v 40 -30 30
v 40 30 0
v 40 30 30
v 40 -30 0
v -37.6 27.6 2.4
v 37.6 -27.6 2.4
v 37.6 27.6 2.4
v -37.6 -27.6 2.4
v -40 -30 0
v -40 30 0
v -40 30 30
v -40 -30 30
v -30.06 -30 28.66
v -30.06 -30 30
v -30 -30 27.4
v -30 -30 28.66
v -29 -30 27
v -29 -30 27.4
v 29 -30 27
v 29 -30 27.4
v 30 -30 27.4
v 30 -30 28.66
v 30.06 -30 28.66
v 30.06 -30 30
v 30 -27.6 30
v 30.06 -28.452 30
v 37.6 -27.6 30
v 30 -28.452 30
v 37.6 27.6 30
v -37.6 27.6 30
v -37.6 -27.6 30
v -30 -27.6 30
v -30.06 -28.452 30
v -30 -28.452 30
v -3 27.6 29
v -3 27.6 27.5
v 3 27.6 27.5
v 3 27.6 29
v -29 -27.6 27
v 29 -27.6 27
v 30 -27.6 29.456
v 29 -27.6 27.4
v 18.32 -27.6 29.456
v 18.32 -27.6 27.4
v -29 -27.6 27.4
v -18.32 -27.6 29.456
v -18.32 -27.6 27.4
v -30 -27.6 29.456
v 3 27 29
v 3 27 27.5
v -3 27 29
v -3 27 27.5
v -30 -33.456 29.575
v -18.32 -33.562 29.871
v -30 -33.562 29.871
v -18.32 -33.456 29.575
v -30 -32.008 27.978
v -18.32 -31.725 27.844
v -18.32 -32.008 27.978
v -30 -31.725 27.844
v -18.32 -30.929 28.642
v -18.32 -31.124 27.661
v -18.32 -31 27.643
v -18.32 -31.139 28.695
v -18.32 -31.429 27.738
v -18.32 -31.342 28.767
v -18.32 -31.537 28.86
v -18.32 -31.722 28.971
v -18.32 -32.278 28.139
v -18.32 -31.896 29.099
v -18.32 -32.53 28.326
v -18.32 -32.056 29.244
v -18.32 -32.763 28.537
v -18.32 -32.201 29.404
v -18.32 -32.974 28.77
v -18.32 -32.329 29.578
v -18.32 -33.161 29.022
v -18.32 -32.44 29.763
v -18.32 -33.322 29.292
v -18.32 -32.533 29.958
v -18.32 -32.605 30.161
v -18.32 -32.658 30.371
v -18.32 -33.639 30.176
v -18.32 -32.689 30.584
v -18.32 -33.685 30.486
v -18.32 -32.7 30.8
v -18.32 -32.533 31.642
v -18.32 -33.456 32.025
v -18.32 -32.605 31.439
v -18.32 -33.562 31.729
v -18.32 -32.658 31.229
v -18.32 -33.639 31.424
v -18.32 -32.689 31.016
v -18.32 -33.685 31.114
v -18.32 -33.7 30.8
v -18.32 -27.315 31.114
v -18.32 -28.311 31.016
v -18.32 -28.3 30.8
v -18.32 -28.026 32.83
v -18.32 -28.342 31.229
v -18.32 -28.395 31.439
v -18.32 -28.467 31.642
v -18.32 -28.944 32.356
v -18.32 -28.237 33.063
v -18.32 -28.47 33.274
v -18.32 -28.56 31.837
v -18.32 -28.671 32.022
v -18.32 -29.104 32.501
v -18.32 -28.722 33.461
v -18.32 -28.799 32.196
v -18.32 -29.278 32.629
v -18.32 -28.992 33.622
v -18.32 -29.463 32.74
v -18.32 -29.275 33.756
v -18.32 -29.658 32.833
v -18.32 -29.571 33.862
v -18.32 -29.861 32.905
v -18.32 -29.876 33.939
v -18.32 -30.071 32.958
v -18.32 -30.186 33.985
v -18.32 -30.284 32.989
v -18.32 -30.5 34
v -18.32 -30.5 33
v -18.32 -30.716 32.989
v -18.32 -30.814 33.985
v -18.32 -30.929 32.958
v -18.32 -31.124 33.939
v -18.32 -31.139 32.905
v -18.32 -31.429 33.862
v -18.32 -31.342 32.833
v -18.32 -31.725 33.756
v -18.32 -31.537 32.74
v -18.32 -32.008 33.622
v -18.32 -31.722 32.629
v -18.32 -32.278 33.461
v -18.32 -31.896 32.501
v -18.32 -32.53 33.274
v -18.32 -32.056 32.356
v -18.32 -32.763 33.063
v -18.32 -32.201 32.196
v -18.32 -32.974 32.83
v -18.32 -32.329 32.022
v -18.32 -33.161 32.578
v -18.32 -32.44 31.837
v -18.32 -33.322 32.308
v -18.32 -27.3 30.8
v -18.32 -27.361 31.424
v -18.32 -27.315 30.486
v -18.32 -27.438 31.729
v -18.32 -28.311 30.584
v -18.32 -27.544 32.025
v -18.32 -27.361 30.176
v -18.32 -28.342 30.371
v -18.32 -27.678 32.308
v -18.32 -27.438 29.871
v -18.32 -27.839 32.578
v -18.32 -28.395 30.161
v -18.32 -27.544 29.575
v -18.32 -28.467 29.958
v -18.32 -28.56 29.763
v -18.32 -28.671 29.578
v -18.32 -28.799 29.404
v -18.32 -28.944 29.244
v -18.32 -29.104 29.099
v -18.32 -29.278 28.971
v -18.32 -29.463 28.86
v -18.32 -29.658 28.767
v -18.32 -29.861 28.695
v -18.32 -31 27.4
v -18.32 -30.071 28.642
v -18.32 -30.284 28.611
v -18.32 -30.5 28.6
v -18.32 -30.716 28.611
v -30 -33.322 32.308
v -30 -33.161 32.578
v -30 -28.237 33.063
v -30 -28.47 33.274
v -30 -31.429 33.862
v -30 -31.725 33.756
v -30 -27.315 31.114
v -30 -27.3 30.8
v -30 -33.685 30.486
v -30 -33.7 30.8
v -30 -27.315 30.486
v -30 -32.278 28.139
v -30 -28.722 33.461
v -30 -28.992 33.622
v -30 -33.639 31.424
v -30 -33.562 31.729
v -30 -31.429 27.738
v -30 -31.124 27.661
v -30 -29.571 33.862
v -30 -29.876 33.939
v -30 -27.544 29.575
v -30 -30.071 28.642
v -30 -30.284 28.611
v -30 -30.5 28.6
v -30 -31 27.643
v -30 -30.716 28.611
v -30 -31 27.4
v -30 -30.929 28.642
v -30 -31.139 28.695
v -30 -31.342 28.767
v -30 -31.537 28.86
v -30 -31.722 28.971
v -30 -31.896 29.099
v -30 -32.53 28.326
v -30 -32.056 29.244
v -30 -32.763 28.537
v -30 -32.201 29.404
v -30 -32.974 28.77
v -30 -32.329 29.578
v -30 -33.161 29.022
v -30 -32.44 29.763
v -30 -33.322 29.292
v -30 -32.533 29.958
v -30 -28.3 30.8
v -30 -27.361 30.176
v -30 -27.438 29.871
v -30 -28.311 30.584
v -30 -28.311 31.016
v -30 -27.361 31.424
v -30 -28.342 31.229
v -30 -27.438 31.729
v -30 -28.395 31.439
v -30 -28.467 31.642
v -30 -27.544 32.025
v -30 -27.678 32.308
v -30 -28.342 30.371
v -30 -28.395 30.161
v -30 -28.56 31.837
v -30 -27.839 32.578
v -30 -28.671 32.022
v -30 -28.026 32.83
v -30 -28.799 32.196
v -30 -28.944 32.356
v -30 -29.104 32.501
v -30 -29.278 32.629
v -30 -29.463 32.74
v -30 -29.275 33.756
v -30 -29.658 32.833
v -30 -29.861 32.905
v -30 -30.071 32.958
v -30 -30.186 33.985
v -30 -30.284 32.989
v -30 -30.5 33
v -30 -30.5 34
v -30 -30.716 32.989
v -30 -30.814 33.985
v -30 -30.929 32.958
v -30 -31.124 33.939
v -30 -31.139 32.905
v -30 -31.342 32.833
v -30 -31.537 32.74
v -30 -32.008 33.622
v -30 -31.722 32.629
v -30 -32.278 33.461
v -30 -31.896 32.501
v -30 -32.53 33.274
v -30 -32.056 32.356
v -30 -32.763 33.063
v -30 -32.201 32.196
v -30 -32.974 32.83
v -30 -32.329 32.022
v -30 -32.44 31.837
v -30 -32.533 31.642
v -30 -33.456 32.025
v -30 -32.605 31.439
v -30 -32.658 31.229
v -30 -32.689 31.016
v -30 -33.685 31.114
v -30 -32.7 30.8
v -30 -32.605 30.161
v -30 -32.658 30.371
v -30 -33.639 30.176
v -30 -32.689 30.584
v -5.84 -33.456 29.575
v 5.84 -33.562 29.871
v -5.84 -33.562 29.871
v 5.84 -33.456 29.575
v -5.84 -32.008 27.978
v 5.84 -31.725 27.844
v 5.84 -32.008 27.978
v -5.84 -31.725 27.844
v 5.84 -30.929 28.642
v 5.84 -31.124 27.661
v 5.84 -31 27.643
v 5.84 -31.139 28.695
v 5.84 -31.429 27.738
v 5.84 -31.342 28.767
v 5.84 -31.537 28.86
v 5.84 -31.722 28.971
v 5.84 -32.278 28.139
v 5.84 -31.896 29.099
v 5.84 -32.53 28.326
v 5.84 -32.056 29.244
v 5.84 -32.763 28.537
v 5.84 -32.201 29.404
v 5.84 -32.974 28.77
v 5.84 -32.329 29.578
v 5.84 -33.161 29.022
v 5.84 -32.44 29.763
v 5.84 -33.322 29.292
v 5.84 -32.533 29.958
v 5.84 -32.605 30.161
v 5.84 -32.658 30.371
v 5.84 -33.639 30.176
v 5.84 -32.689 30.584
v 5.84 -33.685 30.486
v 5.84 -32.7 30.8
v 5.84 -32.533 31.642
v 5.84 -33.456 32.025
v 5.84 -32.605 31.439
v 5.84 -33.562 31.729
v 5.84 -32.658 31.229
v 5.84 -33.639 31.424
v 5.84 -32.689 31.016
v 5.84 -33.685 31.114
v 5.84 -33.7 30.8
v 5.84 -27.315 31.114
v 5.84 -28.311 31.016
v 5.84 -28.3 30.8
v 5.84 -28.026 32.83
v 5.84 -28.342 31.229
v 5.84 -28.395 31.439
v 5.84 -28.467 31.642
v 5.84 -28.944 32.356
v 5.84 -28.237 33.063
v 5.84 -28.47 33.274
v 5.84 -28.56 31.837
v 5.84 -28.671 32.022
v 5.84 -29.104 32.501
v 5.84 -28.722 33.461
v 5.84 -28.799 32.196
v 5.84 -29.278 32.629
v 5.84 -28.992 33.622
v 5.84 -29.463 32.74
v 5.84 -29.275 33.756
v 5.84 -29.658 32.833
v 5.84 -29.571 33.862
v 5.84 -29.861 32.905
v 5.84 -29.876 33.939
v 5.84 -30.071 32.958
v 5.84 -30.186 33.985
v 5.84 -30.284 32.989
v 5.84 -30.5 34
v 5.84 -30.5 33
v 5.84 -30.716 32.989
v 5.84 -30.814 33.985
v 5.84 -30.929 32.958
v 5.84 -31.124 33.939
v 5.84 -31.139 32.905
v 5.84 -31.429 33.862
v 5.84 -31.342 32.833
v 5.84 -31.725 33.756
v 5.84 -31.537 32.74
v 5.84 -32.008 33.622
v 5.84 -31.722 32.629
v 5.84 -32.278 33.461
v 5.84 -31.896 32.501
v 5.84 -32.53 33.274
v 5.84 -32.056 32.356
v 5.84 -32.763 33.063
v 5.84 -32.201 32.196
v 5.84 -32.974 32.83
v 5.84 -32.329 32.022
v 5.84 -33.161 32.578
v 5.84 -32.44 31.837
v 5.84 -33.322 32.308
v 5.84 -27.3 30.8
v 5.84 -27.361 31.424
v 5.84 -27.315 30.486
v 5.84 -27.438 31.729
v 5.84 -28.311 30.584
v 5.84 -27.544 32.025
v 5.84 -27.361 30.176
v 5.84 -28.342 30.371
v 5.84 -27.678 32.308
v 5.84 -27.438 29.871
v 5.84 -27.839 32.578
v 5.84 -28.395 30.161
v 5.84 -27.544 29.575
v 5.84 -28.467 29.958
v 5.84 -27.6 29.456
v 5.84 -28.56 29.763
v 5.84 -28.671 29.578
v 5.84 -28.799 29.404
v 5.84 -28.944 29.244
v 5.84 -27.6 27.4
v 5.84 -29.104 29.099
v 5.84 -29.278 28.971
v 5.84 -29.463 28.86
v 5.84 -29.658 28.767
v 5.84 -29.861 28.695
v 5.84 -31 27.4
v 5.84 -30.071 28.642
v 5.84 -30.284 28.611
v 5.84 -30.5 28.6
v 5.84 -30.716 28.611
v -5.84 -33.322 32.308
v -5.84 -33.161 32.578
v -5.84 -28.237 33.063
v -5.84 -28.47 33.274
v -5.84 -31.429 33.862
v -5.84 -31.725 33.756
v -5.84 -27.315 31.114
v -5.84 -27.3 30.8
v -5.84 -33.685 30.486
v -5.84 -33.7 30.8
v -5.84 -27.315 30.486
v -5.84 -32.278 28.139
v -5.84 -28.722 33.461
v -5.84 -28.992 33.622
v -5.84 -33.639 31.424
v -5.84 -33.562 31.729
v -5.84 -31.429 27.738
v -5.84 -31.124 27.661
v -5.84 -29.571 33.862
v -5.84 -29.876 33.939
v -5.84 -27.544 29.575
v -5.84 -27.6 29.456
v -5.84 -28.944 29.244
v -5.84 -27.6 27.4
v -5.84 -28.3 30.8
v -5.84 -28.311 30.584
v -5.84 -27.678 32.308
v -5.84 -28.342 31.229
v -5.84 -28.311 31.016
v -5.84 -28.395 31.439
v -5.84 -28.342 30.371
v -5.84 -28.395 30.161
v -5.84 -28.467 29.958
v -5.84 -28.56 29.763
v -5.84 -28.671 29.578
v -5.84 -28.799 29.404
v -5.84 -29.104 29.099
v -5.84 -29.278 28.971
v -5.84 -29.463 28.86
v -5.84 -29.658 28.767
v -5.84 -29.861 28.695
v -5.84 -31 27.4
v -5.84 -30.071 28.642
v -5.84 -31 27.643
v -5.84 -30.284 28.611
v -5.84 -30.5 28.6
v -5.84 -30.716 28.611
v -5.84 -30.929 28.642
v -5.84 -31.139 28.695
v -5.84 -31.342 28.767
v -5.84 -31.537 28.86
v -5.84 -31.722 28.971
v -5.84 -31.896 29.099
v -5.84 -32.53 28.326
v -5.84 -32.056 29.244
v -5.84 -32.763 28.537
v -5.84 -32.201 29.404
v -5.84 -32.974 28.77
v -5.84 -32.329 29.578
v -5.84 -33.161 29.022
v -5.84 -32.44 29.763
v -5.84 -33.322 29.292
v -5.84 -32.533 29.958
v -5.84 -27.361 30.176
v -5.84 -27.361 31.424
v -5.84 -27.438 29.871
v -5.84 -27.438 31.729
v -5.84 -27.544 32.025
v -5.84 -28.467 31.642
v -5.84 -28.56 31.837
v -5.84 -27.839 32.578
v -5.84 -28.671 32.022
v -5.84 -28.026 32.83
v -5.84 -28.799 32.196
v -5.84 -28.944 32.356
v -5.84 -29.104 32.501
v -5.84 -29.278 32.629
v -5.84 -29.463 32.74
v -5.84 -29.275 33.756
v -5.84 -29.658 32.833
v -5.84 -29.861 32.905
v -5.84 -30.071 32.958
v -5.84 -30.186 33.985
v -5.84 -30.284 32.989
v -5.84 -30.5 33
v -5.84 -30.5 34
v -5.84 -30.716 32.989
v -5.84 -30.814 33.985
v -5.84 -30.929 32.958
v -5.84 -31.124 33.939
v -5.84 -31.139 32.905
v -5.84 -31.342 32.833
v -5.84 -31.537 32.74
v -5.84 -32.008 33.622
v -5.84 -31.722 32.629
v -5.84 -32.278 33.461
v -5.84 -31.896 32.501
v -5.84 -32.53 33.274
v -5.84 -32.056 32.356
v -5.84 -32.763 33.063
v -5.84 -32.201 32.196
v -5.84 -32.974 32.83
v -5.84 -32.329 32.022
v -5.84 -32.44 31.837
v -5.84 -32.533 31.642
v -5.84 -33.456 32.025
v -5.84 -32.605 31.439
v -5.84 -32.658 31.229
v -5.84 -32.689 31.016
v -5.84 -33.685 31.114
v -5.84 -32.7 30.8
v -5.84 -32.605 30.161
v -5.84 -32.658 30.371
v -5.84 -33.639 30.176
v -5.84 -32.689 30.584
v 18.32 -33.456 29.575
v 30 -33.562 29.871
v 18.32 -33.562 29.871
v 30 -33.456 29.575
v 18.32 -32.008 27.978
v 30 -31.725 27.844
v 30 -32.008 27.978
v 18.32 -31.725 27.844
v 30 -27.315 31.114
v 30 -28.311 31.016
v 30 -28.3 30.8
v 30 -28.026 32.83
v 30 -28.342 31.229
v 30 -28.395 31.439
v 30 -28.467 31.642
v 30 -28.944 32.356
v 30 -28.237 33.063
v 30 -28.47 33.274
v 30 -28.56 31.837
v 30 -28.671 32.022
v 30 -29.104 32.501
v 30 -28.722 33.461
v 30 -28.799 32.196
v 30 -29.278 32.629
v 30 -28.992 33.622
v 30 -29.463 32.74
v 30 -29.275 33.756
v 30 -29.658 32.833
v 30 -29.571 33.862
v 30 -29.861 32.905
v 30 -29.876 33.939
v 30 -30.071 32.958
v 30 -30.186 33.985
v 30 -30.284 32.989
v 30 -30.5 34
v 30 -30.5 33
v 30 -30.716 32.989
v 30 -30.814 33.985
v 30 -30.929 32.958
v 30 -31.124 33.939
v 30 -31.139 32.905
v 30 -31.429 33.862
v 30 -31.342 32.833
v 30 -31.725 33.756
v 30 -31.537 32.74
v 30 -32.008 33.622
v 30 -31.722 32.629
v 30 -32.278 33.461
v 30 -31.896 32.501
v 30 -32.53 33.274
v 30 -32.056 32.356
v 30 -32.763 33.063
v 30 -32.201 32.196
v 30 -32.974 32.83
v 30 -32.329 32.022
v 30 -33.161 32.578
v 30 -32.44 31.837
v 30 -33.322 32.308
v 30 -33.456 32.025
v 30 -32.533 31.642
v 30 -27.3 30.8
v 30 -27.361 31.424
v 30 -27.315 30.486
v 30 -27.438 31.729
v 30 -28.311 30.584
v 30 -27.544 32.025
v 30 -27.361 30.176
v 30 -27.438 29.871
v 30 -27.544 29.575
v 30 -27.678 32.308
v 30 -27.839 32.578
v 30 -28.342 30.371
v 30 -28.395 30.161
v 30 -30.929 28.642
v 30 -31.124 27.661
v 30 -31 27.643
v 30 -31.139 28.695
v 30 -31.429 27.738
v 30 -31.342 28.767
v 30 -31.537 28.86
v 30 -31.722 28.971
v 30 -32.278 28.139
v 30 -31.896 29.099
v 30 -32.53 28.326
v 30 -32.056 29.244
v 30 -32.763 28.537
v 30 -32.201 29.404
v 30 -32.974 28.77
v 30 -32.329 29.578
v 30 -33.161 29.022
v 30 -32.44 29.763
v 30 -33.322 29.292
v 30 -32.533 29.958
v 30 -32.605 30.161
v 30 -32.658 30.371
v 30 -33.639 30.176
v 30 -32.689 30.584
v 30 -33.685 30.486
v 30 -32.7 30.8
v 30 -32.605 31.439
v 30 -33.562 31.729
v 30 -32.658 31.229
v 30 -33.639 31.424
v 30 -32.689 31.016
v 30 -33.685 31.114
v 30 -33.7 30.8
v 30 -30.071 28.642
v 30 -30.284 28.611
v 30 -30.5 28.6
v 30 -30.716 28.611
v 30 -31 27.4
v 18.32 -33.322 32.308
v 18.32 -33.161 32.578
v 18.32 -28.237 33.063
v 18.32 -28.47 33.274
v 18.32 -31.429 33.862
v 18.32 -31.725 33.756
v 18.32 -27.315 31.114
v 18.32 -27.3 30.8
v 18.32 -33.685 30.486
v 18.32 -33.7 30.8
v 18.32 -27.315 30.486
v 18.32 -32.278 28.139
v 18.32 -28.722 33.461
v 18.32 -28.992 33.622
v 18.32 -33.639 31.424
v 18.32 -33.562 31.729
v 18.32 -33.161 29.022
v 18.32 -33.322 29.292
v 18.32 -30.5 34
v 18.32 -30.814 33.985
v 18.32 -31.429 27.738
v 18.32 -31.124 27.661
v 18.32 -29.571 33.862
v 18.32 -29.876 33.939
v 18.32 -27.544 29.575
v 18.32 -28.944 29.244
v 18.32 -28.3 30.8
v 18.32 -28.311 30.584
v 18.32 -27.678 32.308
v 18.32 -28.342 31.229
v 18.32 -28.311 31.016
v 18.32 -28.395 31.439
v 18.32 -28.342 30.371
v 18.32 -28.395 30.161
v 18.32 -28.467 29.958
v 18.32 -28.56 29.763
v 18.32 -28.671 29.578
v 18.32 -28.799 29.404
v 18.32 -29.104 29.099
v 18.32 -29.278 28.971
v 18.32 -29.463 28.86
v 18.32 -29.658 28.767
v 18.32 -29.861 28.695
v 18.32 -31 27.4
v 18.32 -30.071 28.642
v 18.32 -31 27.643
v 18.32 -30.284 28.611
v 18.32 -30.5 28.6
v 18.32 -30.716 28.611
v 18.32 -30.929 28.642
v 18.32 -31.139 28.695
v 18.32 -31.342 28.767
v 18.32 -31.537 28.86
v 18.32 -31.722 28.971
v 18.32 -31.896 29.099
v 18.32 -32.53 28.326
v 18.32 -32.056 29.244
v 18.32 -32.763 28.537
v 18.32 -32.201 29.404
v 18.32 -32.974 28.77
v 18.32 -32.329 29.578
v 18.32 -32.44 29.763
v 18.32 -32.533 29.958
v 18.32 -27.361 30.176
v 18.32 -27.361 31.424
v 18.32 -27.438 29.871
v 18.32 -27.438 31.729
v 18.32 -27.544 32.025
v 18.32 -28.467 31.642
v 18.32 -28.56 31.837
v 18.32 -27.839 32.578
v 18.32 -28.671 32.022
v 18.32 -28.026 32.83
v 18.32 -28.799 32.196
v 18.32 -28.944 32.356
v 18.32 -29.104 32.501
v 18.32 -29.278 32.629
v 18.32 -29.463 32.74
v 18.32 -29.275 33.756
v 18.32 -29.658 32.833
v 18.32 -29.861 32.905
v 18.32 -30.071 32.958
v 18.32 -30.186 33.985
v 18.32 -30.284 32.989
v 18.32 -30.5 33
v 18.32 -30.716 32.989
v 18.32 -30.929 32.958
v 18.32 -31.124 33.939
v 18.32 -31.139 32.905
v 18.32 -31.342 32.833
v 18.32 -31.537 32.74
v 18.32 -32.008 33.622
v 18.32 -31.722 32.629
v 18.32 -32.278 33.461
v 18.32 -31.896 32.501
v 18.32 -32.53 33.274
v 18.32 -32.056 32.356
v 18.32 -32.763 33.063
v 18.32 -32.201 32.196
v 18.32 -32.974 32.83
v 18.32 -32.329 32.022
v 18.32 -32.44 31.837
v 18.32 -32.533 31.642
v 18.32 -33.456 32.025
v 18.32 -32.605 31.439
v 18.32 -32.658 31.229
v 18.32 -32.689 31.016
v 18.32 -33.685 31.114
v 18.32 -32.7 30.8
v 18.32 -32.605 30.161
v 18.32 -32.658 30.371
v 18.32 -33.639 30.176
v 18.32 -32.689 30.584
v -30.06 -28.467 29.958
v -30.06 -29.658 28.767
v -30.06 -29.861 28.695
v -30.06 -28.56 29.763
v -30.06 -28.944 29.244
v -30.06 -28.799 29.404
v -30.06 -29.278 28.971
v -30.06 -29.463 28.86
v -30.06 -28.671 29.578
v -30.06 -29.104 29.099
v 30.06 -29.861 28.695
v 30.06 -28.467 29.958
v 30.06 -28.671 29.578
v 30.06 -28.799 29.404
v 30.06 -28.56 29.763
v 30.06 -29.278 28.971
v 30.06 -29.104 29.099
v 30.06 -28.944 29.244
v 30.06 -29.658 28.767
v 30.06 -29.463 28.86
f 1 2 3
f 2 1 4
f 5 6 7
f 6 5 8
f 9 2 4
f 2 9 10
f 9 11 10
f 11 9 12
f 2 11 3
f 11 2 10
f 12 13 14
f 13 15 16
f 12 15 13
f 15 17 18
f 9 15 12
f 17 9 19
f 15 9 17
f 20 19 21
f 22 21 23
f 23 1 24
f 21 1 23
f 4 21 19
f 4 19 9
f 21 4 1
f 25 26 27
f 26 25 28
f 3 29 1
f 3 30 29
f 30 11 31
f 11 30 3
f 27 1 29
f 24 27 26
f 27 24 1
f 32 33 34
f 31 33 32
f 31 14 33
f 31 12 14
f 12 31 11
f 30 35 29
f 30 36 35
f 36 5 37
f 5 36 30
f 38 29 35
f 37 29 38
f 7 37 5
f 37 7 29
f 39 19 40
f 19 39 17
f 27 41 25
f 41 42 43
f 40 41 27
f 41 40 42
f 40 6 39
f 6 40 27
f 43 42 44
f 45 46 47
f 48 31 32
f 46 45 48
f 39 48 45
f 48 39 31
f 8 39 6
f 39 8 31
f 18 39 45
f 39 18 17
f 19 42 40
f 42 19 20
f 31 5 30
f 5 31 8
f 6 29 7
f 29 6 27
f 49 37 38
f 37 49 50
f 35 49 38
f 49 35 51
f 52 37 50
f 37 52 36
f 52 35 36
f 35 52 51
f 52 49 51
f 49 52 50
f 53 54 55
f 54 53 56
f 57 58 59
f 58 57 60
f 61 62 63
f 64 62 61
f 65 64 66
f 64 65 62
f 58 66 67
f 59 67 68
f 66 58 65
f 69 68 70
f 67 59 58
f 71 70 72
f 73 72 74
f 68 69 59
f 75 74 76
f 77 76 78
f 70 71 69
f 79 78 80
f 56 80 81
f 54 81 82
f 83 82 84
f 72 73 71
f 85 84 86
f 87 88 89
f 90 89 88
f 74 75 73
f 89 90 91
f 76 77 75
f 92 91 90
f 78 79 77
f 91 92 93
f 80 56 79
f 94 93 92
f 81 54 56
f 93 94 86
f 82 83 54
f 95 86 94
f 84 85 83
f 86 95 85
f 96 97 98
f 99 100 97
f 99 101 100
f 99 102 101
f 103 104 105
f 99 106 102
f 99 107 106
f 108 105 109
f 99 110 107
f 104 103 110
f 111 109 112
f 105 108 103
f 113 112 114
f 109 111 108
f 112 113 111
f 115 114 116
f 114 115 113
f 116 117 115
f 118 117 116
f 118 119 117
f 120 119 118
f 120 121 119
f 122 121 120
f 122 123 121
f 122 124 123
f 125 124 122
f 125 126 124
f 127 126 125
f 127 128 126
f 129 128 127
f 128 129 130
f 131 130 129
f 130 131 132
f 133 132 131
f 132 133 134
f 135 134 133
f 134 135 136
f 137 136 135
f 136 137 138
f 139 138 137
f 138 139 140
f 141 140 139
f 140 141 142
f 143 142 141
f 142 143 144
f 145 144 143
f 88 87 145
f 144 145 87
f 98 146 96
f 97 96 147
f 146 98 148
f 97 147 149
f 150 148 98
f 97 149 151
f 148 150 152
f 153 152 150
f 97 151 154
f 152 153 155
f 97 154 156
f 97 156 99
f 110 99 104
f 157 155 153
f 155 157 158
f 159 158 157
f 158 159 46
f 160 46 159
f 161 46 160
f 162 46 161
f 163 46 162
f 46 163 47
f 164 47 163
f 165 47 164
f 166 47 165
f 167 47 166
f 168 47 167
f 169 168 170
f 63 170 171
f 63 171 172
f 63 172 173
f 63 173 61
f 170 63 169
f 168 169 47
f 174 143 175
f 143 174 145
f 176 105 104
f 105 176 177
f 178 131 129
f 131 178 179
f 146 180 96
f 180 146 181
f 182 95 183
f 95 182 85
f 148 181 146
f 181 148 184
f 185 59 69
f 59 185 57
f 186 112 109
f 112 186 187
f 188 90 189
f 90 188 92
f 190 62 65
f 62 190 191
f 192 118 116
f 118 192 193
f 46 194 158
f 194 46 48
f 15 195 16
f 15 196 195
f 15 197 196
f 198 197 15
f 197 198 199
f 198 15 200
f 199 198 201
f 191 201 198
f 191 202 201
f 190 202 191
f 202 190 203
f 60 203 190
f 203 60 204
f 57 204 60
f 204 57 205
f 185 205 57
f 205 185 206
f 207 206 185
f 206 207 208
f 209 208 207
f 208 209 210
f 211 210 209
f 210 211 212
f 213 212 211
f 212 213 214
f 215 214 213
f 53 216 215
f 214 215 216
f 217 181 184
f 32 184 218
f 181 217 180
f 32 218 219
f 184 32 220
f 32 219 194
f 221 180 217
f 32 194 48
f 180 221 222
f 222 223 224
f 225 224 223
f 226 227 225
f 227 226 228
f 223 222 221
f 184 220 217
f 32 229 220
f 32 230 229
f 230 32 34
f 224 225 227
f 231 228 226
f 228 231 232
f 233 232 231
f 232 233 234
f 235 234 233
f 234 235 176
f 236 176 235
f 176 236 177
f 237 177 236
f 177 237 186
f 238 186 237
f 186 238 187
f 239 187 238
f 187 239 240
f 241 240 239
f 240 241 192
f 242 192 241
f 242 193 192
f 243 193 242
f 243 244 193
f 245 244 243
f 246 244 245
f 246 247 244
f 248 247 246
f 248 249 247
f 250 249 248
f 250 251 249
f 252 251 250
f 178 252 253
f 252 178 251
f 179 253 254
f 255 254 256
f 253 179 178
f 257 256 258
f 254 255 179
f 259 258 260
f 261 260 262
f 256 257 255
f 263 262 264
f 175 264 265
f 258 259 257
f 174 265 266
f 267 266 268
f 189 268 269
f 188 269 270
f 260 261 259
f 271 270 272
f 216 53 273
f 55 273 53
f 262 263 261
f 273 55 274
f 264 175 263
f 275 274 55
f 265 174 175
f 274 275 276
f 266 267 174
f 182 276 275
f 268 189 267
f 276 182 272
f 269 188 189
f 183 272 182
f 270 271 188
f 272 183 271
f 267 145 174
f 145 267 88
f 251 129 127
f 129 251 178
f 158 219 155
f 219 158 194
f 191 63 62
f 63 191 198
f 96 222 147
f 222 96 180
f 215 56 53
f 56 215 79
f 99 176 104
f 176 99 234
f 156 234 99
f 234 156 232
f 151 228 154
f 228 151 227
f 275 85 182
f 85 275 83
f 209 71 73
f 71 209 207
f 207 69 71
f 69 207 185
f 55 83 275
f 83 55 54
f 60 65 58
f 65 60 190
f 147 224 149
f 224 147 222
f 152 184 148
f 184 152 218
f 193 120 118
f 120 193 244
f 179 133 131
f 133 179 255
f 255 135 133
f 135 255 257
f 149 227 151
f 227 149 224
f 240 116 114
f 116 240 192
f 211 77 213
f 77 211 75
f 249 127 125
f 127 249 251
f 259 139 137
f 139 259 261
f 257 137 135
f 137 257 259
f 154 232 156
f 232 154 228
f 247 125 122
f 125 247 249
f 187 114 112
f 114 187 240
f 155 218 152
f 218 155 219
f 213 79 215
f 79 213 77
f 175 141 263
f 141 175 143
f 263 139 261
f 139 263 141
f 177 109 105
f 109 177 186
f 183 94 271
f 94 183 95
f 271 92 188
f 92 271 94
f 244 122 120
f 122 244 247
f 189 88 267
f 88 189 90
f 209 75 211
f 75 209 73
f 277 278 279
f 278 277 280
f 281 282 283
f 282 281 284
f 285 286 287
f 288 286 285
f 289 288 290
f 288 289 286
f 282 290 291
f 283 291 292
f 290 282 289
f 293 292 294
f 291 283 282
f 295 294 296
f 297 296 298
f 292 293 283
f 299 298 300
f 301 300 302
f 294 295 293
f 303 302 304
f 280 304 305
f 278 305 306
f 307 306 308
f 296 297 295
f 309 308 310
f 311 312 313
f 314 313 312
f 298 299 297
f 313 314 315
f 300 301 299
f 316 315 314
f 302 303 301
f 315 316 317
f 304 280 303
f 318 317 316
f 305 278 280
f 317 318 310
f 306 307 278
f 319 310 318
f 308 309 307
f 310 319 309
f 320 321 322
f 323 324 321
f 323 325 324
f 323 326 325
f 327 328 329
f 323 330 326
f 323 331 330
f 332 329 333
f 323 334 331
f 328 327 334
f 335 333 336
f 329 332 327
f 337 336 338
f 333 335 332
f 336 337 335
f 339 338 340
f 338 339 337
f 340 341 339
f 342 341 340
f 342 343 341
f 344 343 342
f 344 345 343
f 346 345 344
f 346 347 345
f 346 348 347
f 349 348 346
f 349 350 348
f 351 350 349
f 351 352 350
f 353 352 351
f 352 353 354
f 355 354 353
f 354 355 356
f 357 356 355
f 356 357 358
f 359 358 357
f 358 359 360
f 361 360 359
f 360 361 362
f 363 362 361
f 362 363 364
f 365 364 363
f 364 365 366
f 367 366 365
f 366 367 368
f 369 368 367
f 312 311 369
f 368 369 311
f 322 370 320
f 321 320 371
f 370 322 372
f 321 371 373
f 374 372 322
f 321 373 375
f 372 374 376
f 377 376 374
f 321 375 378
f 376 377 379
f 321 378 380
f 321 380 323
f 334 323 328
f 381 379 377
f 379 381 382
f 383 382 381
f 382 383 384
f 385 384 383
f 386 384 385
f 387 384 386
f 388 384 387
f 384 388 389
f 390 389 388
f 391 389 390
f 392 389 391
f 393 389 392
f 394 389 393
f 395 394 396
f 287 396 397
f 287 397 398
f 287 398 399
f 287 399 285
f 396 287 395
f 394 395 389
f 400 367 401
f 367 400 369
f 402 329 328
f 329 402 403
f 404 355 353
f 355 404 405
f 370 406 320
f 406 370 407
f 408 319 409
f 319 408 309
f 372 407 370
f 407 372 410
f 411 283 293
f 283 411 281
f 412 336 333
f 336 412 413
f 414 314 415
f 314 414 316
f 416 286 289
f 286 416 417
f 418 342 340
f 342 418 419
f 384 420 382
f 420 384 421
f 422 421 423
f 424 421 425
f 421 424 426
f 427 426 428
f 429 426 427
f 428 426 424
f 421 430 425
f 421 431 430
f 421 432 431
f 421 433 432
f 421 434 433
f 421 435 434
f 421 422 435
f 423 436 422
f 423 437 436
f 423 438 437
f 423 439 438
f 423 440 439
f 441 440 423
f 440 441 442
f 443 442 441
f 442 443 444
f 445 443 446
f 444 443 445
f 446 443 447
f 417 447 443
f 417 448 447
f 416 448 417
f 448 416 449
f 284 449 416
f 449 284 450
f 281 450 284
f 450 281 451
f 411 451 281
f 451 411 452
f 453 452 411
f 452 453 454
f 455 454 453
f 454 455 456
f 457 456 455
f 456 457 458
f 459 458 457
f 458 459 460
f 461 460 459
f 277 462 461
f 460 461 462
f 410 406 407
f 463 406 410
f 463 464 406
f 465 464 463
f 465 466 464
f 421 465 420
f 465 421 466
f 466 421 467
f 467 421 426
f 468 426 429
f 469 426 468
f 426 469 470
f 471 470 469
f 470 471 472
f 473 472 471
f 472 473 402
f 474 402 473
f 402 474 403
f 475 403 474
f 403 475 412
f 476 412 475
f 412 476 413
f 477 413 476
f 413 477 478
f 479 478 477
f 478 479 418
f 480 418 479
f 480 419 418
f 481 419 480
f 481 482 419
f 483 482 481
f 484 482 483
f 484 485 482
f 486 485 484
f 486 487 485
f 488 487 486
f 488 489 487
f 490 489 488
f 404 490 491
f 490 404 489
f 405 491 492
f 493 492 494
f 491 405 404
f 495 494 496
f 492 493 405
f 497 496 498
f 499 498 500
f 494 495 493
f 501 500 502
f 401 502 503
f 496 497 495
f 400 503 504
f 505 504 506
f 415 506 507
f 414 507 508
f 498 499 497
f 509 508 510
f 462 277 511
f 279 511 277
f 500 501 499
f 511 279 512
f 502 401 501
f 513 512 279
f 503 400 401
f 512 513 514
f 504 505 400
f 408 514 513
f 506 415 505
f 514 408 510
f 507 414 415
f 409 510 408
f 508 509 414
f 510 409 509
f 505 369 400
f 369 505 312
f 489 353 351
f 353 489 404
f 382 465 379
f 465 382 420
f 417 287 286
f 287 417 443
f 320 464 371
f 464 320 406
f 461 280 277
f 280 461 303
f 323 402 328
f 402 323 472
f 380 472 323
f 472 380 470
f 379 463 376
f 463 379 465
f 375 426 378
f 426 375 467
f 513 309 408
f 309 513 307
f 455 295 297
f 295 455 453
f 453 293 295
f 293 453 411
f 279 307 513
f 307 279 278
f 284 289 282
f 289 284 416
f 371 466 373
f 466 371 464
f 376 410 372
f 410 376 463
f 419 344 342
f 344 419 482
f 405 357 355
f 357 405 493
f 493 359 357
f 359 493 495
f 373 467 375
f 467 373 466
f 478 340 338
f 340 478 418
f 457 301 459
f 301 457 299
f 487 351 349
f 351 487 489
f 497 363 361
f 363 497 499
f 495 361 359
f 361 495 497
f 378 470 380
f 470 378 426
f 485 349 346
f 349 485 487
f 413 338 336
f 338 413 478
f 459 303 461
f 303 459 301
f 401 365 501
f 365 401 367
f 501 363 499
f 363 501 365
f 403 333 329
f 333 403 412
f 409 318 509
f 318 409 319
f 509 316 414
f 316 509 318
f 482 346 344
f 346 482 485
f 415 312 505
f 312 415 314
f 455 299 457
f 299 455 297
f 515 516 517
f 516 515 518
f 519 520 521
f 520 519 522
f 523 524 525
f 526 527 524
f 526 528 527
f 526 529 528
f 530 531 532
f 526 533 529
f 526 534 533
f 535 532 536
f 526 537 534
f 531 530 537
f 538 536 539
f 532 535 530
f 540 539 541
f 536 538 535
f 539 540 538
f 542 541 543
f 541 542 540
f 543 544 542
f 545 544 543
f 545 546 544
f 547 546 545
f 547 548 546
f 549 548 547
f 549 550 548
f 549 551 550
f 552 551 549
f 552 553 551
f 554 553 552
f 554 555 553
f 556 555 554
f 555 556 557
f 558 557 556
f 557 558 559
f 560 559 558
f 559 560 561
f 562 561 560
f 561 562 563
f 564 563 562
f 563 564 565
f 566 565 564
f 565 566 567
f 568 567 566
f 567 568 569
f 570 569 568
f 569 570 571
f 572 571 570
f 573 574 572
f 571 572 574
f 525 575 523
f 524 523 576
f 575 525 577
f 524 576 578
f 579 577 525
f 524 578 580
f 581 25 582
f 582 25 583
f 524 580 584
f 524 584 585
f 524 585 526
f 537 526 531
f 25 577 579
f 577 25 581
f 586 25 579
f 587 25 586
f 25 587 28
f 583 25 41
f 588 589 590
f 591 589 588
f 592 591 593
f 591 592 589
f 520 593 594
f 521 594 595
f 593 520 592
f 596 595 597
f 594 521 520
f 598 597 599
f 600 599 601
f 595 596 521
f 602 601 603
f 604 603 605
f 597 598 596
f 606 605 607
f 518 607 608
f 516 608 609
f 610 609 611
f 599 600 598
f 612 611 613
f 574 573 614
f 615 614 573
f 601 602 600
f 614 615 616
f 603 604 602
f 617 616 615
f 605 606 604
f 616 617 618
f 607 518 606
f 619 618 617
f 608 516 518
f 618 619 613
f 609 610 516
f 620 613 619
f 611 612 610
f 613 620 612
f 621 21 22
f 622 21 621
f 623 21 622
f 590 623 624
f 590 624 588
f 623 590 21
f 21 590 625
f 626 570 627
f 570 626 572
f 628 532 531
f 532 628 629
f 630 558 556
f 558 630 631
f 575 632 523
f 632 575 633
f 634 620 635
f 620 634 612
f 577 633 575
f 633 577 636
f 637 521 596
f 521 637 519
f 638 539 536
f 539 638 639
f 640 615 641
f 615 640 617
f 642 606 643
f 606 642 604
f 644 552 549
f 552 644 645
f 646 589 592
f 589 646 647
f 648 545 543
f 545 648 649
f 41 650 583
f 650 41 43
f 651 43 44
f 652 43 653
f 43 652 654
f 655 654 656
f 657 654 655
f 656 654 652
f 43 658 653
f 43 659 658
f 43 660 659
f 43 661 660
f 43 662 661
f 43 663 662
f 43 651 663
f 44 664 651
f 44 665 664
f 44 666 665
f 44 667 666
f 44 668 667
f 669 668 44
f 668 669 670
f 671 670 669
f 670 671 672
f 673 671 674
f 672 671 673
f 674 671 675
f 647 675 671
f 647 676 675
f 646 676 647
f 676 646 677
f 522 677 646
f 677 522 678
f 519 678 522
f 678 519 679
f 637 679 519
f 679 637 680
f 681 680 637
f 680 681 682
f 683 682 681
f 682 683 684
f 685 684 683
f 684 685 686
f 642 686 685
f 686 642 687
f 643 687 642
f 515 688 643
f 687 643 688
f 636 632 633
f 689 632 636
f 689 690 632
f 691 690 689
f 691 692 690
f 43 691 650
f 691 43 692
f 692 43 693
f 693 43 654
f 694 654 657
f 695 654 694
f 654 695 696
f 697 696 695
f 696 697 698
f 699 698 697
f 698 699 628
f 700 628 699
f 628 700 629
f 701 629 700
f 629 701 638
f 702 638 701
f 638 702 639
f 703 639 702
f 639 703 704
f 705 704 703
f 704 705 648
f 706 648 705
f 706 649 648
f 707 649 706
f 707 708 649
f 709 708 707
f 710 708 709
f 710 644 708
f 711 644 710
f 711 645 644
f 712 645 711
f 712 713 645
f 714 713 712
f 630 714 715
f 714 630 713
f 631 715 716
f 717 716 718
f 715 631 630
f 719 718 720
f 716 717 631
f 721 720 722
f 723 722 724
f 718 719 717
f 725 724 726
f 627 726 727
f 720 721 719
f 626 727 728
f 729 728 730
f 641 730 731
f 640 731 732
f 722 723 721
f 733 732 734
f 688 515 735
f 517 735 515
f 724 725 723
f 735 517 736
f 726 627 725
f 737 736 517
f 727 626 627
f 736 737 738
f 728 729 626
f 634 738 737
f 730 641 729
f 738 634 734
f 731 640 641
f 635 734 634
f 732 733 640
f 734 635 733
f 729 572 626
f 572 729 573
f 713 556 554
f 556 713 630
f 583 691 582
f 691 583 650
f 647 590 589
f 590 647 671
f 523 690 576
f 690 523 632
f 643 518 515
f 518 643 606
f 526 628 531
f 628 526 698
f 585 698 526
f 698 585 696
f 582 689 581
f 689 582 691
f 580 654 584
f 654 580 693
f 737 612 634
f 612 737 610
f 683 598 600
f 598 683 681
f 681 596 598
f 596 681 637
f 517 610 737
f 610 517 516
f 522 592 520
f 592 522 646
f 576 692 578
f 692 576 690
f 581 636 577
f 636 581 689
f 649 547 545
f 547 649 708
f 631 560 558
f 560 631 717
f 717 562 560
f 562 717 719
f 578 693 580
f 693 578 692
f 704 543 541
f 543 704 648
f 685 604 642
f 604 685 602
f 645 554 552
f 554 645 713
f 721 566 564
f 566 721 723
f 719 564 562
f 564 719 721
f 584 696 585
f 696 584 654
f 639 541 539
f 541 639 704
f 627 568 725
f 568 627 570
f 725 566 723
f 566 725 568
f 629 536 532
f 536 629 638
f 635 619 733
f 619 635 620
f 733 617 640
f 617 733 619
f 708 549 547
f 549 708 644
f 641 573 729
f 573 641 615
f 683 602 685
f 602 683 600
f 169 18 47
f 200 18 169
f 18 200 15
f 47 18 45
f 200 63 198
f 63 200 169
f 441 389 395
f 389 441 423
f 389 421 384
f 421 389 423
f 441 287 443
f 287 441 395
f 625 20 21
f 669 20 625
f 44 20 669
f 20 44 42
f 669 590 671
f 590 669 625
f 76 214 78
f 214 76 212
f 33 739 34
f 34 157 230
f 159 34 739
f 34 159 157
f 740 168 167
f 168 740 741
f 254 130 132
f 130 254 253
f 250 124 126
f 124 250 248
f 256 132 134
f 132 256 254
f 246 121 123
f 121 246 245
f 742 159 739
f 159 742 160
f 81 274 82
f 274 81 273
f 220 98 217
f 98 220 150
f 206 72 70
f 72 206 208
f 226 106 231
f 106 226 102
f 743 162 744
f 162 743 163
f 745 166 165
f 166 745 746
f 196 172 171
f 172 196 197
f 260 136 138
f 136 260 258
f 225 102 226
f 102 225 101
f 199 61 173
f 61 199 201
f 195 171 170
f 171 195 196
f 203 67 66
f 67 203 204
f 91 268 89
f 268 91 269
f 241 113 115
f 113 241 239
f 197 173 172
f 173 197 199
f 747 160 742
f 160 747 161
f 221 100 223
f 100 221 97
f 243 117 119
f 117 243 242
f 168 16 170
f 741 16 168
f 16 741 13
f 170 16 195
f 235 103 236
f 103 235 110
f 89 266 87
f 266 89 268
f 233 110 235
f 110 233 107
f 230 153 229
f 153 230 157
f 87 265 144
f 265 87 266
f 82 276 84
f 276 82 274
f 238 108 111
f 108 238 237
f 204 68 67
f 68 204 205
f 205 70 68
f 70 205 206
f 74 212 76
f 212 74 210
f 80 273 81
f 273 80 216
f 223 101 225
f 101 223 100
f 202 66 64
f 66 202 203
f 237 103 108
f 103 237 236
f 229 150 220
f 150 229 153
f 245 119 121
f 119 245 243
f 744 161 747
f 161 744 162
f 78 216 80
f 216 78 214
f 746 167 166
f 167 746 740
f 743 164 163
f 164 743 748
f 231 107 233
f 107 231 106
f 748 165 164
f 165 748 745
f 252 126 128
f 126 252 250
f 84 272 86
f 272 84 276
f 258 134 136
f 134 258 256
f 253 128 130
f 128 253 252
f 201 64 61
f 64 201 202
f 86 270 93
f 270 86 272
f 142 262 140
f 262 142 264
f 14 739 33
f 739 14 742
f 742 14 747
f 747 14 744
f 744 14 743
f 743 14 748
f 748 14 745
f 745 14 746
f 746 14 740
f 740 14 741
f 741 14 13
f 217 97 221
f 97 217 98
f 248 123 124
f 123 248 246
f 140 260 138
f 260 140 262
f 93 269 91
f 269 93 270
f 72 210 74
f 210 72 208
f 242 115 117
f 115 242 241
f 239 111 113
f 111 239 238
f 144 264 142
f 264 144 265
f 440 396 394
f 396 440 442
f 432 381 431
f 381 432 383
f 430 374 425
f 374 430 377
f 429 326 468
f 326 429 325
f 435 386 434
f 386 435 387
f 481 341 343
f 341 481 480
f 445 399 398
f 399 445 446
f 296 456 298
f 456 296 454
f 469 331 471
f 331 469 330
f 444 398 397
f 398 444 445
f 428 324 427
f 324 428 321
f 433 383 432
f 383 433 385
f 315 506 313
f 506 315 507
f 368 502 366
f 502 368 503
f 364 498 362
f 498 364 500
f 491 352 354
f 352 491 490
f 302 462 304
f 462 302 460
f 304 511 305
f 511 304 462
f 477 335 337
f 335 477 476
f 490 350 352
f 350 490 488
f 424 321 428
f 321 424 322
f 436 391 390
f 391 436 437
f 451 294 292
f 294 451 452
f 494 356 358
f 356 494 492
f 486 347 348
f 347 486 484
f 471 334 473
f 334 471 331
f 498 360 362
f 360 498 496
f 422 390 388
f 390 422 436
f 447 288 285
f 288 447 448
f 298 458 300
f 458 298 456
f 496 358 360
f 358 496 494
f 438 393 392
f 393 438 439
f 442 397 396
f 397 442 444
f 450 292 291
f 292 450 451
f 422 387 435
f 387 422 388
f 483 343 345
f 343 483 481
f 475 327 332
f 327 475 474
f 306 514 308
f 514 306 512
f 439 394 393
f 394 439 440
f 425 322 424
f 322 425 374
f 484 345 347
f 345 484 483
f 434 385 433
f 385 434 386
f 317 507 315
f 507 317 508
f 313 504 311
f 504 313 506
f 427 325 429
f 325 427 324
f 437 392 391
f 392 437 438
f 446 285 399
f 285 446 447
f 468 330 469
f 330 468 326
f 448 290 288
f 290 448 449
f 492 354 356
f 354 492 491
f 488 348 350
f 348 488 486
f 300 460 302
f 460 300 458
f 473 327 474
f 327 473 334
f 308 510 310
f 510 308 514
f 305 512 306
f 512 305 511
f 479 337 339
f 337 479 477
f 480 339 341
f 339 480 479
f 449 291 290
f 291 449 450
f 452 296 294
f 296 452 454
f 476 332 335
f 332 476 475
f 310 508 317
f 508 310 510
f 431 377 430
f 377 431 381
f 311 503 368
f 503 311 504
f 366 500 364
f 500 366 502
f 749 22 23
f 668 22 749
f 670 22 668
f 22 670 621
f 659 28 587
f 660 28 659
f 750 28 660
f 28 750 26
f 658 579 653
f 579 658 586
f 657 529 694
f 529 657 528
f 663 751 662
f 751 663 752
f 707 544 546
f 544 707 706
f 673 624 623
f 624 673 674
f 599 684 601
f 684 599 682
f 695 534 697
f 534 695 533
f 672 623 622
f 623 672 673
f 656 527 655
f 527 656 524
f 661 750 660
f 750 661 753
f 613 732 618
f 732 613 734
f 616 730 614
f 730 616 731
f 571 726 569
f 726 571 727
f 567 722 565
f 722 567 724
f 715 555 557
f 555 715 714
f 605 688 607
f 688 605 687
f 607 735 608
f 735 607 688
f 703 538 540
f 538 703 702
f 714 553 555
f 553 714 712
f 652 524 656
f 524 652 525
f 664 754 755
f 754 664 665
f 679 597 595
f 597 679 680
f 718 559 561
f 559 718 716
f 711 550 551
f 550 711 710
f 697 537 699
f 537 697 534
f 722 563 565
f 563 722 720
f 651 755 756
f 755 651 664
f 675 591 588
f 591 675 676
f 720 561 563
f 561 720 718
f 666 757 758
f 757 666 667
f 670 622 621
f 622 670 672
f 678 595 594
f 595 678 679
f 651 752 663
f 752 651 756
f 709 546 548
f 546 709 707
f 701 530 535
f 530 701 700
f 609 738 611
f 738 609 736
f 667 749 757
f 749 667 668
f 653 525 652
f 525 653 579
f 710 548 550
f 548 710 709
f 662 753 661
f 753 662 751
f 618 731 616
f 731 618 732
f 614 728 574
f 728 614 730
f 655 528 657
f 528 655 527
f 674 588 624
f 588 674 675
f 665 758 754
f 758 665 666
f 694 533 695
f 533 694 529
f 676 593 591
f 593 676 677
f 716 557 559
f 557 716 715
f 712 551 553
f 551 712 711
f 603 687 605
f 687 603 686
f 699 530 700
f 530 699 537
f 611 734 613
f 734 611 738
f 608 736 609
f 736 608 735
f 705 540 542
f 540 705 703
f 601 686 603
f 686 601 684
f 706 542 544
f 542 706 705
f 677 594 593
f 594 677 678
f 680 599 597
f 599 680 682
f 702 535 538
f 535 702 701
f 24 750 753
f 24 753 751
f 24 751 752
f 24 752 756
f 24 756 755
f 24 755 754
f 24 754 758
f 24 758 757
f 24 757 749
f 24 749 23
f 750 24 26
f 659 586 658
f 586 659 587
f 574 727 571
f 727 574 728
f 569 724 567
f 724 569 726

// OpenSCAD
// Box with print-in-place hinge (v3: global bore subtraction, hinge cutouts)
part = "box";
cadverify_only = "";
module instance(name, part, unit = 1) {
    echo(cadverify_instance = [name, part, unit]);
    if (cadverify_only == "" || cadverify_only == name) children();
}

Rkn = 3.2; rbore = 2.2; rpin = 1.9;
yh = -30.5; zh = 30.8;
lid_zh = 3.4;
lid_lift = 27.4;
pin_lift_z = 27.8; pin_shift_y = -30.5;
k0x0=-30; k0x1=-18.32;
k1x0=-17.92; k1x1=-6.24;
k2x0=-5.84; k2x1=5.84;
k3x0=6.24; k3x1=17.92;
k4x0=18.32; k4x1=30;

$fn = 64;

module xcyl(x0, x1, r, y, z) {
    translate([x0, y, z]) rotate([0, 90, 0]) cylinder(r = r, h = x1 - x0);
}

module box_part() {
    difference() {
        union() {
            translate([-40, -30, 0]) cube([80, 60, 2.4]);
            translate([-40, 27.6, 2.4]) cube([80, 2.4, 27.6]);
            translate([-40, -30, 2.4]) cube([80, 2.4, 24.6]);
            translate([-40, -30, 27.0]) cube([11, 2.4, 3.0]);
            translate([29, -30, 27.0]) cube([11, 2.4, 3.0]);
            translate([-40, -27.6, 2.4]) cube([2.4, 55.2, 27.6]);
            translate([37.6, -27.6, 2.4]) cube([2.4, 55.2, 27.6]);
            translate([-3, 27.0, 27.5]) cube([6, 0.6, 1.5]);
            xcyl(k0x0, k0x1, Rkn, yh, zh);
            xcyl(k2x0, k2x1, Rkn, yh, zh);
            xcyl(k4x0, k4x1, Rkn, yh, zh);
            translate([k0x0, -31, 27.4]) cube([k0x1-k0x0, 3.4, 3.4]);
            translate([k2x0, -31, 27.4]) cube([k2x1-k2x0, 3.4, 3.4]);
            translate([k4x0, -31, 27.4]) cube([k4x1-k4x0, 3.4, 3.4]);
        }
        xcyl(k0x0-0.06, k0x1+0.06, rbore, yh, zh);
        xcyl(k2x0-0.06, k2x1+0.06, rbore, yh, zh);
        xcyl(k4x0-0.06, k4x1+0.06, rbore, yh, zh);
    }
}

module lid_part() {
    difference() {
        union() {
            translate([-40, -30, 10.6]) cube([80, 60, 2.4]);
            translate([-40, 27.6, 3]) cube([80, 2.4, 7.6]);
            translate([k1x0, -30, 3]) cube([k1x1-k1x0, 2.4, 7.6]);
            translate([k3x0, -30, 3]) cube([k3x1-k3x0, 2.4, 7.6]);
            translate([-40, -30, 3]) cube([11, 2.4, 7.6]);
            translate([29, -30, 3]) cube([11, 2.4, 7.6]);
            translate([-40, -27.6, 3]) cube([2.4, 55.2, 7.6]);
            translate([37.6, -27.6, 3]) cube([2.4, 55.2, 7.6]);
            translate([-37.2, 25.2, 0]) cube([74.4, 2.0, 10.6]);
            translate([-37.2, -27.2, 0]) cube([74.4, 2.0, 10.6]);
            translate([-37.2, -25.2, 0]) cube([2.0, 50.4, 10.6]);
            translate([35.2, -25.2, 0]) cube([2.0, 50.4, 10.6]);
            xcyl(k1x0, k1x1, Rkn, yh, lid_zh);
            xcyl(k3x0, k3x1, Rkn, yh, lid_zh);
            translate([k1x0, -31, 0]) cube([k1x1-k1x0, 3.4, 5]);
            translate([k3x0, -31, 0]) cube([k3x1-k3x0, 3.4, 5]);
        }
        xcyl(k1x0-0.06, k1x1+0.06, rbore, yh, lid_zh);
        xcyl(k3x0-0.06, k3x1+0.06, rbore, yh, lid_zh);
        translate([-3.3, 26.3, -0.05]) cube([6.6, 1.5, 2.05]);
    }
}

module pin_part() {
    union() {
        xcyl(-32.4, 32.4, rpin, 0, 3);
        xcyl(30.4, 32.4, 3, 0, 3);
        xcyl(-32.4, -30.4, 3, 0, 3);
    }
}

if (part == "box") {
    echo(cadverify_spec = [
        ["bounds", [[-40, -33.7, 0], [40, 30, 34.0]]],
        ["bodies", 1],
        ["through_holes", 3],
        ["support_faces", [["bed", "-z", 4000]]],
        ["overhangs_allowed", [["hinge knuckles, bores and wall cutouts print in place", [[-30.2, -33.9, 26.5], [30.2, -27.1, 33.5]]]]],
        ["copies", 1],
        ["details", [
            ["floor", "thickness", [0, 0, -1], [0, 0, 1], 2.4],
            ["front_wall", "thickness", [0, 31, 15], [0, -1, 0], 2.4],
            ["cavity", "void", [[-37.6, -27.6, 2.4], [37.6, 27.6, 29.9]], 0.9],
            ["hinge_bore", "hole", [-31, -30.5, 30.8], [1, 0, 0], [[0, 4.4], [11.6, 4.4]]],
            ["catch_bump", "material", [[-3, 27.0, 27.5], [3, 27.6, 29.0]], 0.9],
            ["hinge_view", "view", [[-30, -34, 26.5], [30, -27, 34.5]]]
        ]]
    ]);
    box_part();
} else if (part == "lid") {
    echo(cadverify_spec = [
        ["bounds", [[-40, -33.7, 0], [40, 30, 13]]],
        ["bodies", 1],
        ["through_holes", 2],
        ["support_faces", [["bed", "-z", 300]]],
        ["overhangs_allowed", [
            ["hinge knuckles and bores print in place", [[-18.2, -33.9, 0], [18.2, -27.1, 4.2]]],
            ["skirt cutout top bridges", [[-30.2, -30.2, 6.5], [30.2, -27.4, 7.5]]],
            ["lid top bridging over plug cavity", [[-37.2, -24.9, 10.1], [37.2, 25.2, 11.1]]]
        ]],
        ["copies", 1],
        ["details", [
            ["top", "thickness", [0, 0, 14], [0, 0, -1], 2.4],
            ["skirt", "thickness", [0, 31, 6], [0, -1, 0], 2.4],
            ["plug_cavity", "void", [[-35.2, -24.9, 0], [35.2, 25.2, 10.5]], 0.9],
            ["hinge_bore", "hole", [-18.6, -30.5, 3.4], [1, 0, 0], [[0, 4.4], [11.6, 4.4]]],
            ["catch_notch", "void", [[-3.3, 26.3, 0], [3.3, 27.8, 2.0]], 0.9],
            ["catch_view", "view", [[-5, 26, 0], [5, 28.5, 3]]]
        ]]
    ]);
    lid_part();
} else if (part == "pin") {
    echo(cadverify_spec = [
        ["bounds", [[-32.4, -3, 0], [32.4, 3, 6]]],
        ["bodies", 1],
        ["support_faces", []],
        ["overhangs_allowed", [["pin shaft underside bridges with 0.3 gap", [[-32.4, -1.9, 0], [32.4, 1.9, 1.6]]]]],
        ["copies", 1],
        ["details", [
            ["shaft", "thickness", [0, 3, 3], [0, -1, 0], 3.8],
            ["head", "material", [[30.4, -3, 0], [32.4, 3, 6]], 0.7],
            ["pin_view", "view", [[-32.4, -3, 0], [32.4, 3, 6]]]
        ]]
    ]);
    pin_part();
} else if (part == "assembly") {
    echo(cadverify_spec = [
        ["bounds", [[-40, -33.7, 0], [40, 30, 40.4]]],
        ["support_faces", [["bed", "-z", 4000]]],
        ["allowed_interferences", []],
        ["motions", [
            ["lid_open", ["lid"], "rotate", [0, -30.5, 30.8], [1, 0, 0], [0, 110], ["flex", [["lid", "box", 0.5, "catch bump clearance pass"]]]]
        ]],
        ["assembly_order", [
            [["box"], [0, 0, 0]],
            [["lid"], [0, 0, -1]],
            [["pin"], [1, 0, 0]]
        ]],
        ["print_in_place", 0.3],
        ["overhangs_allowed", [
            ["hinge undersides, pin bridge and cutouts in place", [[-33, -34, 26.5], [33, -27, 34.8]]],
            ["lid top bridging over box cavity", [[-37.2, -24.9, 37.5], [37.2, 25.2, 38.5]]]
        ]]
    ]);
    instance("box", "box") box_part();
    instance("lid", "lid") translate([0, 0, lid_lift]) lid_part();
    instance("pin", "pin") translate([0, pin_shift_y, pin_lift_z]) pin_part();
}
